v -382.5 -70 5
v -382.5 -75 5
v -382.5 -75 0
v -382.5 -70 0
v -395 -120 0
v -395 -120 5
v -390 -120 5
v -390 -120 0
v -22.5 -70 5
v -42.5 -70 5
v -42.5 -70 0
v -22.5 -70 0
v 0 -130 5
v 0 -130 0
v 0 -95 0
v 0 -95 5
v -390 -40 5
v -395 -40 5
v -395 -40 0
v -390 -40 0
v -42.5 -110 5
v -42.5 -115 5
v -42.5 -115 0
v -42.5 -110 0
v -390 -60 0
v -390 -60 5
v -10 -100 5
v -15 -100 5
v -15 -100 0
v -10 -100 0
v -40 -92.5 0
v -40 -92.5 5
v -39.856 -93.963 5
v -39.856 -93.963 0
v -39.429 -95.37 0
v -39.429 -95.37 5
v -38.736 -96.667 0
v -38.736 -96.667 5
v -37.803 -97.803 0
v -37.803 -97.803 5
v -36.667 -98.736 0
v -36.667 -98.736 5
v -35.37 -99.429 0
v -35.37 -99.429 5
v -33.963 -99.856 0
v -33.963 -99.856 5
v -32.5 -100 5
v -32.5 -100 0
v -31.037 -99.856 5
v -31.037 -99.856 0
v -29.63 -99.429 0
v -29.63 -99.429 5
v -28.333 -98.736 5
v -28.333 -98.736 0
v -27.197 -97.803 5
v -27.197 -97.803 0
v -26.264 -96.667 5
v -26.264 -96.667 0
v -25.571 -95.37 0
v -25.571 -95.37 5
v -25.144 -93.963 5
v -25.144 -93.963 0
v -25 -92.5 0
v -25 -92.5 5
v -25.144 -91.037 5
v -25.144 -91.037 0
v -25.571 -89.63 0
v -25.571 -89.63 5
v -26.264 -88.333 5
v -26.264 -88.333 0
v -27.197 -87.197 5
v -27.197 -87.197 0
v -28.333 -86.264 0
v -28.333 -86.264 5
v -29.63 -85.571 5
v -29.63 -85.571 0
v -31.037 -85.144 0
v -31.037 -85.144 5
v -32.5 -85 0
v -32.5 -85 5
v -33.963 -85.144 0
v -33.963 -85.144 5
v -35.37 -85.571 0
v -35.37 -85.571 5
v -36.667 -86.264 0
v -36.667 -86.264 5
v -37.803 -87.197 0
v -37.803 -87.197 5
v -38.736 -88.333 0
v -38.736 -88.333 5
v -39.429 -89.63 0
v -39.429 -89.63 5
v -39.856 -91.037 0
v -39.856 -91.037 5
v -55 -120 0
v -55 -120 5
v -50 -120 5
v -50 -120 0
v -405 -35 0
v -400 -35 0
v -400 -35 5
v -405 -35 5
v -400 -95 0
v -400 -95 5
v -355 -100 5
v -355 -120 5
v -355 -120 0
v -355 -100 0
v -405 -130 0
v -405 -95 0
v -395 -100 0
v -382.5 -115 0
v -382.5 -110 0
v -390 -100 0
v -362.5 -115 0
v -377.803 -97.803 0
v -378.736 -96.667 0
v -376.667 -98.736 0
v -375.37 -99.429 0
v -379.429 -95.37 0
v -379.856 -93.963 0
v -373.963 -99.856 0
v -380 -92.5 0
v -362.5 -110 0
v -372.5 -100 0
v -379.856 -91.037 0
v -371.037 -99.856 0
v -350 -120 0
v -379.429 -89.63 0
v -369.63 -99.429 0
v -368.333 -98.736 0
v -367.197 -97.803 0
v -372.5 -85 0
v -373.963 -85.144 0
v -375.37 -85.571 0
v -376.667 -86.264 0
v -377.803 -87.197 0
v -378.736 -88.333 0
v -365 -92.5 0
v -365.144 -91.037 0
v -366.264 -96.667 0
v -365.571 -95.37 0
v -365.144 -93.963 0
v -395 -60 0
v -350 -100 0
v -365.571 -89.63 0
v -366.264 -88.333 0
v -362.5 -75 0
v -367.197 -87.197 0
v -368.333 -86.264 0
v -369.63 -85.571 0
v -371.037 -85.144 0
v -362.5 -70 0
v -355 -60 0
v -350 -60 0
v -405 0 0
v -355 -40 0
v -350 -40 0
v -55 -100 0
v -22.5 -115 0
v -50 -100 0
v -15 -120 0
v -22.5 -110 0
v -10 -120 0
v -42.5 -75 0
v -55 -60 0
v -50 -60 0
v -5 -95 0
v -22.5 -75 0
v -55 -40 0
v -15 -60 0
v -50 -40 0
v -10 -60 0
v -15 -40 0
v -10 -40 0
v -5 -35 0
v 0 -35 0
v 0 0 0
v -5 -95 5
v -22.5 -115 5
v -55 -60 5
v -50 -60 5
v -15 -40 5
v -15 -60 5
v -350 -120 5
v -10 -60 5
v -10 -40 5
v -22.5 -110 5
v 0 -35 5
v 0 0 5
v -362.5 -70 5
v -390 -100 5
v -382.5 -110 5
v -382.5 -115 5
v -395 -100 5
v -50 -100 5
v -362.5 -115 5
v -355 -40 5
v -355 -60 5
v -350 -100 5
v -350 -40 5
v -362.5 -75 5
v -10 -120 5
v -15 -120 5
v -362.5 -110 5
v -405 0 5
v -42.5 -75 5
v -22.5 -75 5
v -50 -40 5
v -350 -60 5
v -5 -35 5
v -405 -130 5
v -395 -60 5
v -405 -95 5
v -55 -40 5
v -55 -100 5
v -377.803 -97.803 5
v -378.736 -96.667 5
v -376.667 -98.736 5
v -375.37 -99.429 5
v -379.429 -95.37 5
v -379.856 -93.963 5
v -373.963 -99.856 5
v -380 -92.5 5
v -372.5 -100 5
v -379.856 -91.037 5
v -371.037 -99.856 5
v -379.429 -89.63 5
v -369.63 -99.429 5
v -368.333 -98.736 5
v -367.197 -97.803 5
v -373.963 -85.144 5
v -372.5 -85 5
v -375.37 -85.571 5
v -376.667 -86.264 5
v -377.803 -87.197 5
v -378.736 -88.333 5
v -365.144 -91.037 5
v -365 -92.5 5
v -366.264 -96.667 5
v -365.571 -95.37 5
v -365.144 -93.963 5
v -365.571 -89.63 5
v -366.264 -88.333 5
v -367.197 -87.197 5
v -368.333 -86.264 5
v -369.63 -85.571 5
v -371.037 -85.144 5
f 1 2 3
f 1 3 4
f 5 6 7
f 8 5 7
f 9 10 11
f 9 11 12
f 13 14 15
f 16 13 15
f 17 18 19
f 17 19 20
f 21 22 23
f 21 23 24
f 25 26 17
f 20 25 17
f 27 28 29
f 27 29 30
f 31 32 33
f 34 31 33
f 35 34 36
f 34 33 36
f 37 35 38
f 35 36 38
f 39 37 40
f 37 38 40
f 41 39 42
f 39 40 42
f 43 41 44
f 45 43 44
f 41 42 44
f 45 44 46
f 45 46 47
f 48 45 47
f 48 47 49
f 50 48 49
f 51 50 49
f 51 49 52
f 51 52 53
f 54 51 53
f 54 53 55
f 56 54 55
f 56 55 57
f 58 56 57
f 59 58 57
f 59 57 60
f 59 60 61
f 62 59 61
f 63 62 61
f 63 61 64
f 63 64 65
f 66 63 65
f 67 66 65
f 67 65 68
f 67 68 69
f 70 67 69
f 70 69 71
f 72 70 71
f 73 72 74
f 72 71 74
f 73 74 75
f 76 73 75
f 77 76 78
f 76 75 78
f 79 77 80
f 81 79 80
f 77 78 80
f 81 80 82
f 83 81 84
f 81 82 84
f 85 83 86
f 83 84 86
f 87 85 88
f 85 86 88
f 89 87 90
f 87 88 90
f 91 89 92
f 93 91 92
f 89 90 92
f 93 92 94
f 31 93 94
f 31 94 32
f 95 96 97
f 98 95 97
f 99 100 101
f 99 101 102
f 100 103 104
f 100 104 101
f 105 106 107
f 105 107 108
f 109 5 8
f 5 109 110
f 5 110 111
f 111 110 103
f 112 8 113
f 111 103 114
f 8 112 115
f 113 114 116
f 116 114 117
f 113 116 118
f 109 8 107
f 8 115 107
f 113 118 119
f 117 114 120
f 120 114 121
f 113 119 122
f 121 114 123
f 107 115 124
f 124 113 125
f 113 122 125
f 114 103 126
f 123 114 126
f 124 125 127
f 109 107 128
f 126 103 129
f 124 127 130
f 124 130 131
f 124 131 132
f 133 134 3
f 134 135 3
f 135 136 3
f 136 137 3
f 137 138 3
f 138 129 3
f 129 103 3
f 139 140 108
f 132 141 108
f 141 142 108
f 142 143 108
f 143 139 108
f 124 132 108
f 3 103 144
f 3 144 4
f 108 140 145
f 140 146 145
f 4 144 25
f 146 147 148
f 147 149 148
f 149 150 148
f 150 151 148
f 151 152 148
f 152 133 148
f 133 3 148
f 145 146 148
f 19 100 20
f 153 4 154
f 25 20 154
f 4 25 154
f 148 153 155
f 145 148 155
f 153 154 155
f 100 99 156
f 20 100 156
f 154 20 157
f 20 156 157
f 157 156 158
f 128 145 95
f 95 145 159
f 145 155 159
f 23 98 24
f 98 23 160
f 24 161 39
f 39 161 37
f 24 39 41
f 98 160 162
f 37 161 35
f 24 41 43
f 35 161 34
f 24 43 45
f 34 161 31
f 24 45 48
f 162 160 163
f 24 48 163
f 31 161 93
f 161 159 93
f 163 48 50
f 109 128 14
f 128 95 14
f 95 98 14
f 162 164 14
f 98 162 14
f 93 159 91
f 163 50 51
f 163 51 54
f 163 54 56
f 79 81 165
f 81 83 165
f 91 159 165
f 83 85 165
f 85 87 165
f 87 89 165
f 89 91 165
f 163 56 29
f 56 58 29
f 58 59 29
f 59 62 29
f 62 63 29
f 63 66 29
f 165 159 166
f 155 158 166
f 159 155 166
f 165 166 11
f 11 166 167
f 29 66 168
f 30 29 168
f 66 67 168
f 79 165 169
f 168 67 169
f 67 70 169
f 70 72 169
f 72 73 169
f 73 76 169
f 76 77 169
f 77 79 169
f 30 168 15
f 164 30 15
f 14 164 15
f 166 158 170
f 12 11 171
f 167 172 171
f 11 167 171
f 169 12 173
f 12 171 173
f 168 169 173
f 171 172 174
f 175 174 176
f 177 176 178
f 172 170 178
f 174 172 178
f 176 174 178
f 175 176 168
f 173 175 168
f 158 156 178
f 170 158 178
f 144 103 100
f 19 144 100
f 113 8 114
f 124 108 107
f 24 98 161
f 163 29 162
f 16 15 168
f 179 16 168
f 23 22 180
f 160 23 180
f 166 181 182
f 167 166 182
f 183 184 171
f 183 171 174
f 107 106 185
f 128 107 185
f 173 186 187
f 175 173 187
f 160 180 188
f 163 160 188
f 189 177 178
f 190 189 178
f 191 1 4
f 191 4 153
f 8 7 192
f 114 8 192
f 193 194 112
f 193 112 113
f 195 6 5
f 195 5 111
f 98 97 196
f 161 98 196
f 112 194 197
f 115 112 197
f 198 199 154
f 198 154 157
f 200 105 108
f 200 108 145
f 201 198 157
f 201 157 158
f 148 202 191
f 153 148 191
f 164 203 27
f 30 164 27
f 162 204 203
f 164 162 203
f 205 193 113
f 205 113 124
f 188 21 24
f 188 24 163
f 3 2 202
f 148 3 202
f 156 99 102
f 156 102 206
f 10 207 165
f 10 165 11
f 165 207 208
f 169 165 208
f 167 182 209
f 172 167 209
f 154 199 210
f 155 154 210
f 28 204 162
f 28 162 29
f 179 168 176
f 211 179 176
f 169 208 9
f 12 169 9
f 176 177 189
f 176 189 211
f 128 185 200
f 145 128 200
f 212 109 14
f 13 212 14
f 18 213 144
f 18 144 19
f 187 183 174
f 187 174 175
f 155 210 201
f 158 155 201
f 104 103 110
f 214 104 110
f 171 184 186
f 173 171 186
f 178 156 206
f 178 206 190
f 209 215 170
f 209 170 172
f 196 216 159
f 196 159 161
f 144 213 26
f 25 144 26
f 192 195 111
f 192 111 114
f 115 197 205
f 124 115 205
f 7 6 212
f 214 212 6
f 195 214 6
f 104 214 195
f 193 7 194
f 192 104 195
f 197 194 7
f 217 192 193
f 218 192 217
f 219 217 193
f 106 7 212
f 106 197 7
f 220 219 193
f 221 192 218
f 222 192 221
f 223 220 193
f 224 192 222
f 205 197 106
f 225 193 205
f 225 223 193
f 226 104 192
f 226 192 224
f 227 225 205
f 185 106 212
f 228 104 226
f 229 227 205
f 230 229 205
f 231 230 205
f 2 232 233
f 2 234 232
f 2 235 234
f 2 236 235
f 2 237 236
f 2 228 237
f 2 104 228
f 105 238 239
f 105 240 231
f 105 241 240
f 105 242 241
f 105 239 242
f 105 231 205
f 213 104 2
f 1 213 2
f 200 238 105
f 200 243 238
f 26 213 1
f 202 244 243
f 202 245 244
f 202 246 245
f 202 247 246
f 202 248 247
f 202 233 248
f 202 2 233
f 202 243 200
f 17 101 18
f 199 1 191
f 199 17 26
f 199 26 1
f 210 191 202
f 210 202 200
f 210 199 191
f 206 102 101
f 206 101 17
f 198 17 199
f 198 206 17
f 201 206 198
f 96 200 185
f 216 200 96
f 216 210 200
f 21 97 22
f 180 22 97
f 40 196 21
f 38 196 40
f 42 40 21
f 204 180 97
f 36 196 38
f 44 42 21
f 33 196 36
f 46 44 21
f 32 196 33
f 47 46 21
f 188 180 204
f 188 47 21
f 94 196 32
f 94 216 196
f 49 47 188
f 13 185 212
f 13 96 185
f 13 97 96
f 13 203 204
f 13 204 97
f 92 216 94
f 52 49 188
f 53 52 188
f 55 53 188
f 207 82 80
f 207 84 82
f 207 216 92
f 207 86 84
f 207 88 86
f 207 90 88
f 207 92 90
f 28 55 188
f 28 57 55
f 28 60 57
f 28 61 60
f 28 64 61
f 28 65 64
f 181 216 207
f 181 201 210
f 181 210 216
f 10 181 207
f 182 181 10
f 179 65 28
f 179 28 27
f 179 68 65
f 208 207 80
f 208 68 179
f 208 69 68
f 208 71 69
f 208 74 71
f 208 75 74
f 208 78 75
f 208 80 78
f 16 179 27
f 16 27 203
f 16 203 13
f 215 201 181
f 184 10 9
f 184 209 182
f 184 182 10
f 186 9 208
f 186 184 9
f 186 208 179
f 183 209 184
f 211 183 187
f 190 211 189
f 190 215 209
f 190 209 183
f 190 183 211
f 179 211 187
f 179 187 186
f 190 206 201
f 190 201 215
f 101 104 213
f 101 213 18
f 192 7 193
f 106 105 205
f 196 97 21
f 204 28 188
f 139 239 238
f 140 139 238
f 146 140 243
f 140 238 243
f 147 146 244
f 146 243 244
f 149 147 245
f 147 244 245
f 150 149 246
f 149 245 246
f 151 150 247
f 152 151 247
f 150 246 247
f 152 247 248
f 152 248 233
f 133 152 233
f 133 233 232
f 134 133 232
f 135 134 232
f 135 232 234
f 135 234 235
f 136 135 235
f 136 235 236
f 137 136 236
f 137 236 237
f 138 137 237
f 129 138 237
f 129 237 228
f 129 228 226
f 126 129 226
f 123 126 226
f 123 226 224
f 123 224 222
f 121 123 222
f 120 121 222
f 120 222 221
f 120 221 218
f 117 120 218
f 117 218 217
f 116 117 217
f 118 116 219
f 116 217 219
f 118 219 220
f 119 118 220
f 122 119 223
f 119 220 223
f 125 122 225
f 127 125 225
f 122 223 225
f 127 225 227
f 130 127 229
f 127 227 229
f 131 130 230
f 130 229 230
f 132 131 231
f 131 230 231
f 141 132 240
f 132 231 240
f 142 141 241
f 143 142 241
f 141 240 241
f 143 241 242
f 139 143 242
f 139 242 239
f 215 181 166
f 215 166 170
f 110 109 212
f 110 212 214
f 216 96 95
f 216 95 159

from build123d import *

# Parameters (mm, degrees)
SKETCH1_W           = 405
SKETCH1_H           = 130
BOSS_EXTRUDE1_DEPTH = 5
SKETCH2_W           = 5
SKETCH2_H           = 60
CUT_EXTRUDE1_DEPTH  = 5
SKETCH3_W           = 5
SKETCH3_H           = 20
CUT_EXTRUDE2_DEPTH  = 10
SKETCH4_W           = 20
SKETCH4_H           = 5
CUT_EXTRUDE3_DEPTH  = 10
SKETCH5_R           = 7.5
CUT_EXTRUDE4_DEPTH  = 10


with BuildPart() as part:
    # Sketch1 → Boss-Extrude1 (new body)
    with BuildSketch(Plane.XY):
        with Locations((-202.5, -65)):
            Rectangle(SKETCH1_W, SKETCH1_H)
    extrude(amount=BOSS_EXTRUDE1_DEPTH)

    # Sketch2 → Cut-Extrude1 (cut)
    with BuildSketch(Plane(origin=(0, 0, 0), x_dir=(-1, 0, 0), z_dir=(0, 0, -1))):
        with Locations((402.5, -65)):
            Rectangle(SKETCH2_W, SKETCH2_H)
        with Locations((2.5, -65)):
            Rectangle(SKETCH2_W, SKETCH2_H)
    extrude(amount=-CUT_EXTRUDE1_DEPTH, mode=Mode.SUBTRACT)

    # Sketch3 → Cut-Extrude2 (cut)
    with BuildSketch(Plane.XY.offset(5)):
        with Locations((-392.5, -110)):
            Rectangle(SKETCH3_W, SKETCH3_H)
        with Locations((-392.5, -50)):
            Rectangle(SKETCH3_W, SKETCH3_H)
        with Locations((-352.5, -50)):
            Rectangle(SKETCH3_W, SKETCH3_H)
        with Locations((-352.5, -110)):
            Rectangle(SKETCH3_W, SKETCH3_H)
        with Locations((-52.5, -110)):
            Rectangle(SKETCH3_W, SKETCH3_H)
        with Locations((-52.5, -50)):
            Rectangle(SKETCH3_W, SKETCH3_H)
        with Locations((-12.5, -50)):
            Rectangle(SKETCH3_W, SKETCH3_H)
        with Locations((-12.5, -110)):
            Rectangle(SKETCH3_W, SKETCH3_H)
    extrude(amount=-CUT_EXTRUDE2_DEPTH, mode=Mode.SUBTRACT)

    # Sketch4 → Cut-Extrude3 (cut)
    with BuildSketch(Plane.XY.offset(5)):
        with Locations((-372.5, -112.5)):
            Rectangle(SKETCH4_W, SKETCH4_H)
        with Locations((-372.5, -72.5)):
            Rectangle(SKETCH4_W, SKETCH4_H)
        with Locations((-32.5, -112.5)):
            Rectangle(SKETCH4_W, SKETCH4_H)
        with Locations((-32.5, -72.5)):
            Rectangle(SKETCH4_W, SKETCH4_H)
    extrude(amount=-CUT_EXTRUDE3_DEPTH, mode=Mode.SUBTRACT)

    # Sketch5 → Cut-Extrude4 (cut)
    with BuildSketch(Plane.XY.offset(5)):
        with Locations((-372.5, -92.5)):
            Circle(SKETCH5_R)
        with Locations(Location((-32.5, -92.5, 0), (0, 0, 180))):
            Circle(SKETCH5_R)
    extrude(amount=-CUT_EXTRUDE4_DEPTH, mode=Mode.SUBTRACT)


solid = part.part
